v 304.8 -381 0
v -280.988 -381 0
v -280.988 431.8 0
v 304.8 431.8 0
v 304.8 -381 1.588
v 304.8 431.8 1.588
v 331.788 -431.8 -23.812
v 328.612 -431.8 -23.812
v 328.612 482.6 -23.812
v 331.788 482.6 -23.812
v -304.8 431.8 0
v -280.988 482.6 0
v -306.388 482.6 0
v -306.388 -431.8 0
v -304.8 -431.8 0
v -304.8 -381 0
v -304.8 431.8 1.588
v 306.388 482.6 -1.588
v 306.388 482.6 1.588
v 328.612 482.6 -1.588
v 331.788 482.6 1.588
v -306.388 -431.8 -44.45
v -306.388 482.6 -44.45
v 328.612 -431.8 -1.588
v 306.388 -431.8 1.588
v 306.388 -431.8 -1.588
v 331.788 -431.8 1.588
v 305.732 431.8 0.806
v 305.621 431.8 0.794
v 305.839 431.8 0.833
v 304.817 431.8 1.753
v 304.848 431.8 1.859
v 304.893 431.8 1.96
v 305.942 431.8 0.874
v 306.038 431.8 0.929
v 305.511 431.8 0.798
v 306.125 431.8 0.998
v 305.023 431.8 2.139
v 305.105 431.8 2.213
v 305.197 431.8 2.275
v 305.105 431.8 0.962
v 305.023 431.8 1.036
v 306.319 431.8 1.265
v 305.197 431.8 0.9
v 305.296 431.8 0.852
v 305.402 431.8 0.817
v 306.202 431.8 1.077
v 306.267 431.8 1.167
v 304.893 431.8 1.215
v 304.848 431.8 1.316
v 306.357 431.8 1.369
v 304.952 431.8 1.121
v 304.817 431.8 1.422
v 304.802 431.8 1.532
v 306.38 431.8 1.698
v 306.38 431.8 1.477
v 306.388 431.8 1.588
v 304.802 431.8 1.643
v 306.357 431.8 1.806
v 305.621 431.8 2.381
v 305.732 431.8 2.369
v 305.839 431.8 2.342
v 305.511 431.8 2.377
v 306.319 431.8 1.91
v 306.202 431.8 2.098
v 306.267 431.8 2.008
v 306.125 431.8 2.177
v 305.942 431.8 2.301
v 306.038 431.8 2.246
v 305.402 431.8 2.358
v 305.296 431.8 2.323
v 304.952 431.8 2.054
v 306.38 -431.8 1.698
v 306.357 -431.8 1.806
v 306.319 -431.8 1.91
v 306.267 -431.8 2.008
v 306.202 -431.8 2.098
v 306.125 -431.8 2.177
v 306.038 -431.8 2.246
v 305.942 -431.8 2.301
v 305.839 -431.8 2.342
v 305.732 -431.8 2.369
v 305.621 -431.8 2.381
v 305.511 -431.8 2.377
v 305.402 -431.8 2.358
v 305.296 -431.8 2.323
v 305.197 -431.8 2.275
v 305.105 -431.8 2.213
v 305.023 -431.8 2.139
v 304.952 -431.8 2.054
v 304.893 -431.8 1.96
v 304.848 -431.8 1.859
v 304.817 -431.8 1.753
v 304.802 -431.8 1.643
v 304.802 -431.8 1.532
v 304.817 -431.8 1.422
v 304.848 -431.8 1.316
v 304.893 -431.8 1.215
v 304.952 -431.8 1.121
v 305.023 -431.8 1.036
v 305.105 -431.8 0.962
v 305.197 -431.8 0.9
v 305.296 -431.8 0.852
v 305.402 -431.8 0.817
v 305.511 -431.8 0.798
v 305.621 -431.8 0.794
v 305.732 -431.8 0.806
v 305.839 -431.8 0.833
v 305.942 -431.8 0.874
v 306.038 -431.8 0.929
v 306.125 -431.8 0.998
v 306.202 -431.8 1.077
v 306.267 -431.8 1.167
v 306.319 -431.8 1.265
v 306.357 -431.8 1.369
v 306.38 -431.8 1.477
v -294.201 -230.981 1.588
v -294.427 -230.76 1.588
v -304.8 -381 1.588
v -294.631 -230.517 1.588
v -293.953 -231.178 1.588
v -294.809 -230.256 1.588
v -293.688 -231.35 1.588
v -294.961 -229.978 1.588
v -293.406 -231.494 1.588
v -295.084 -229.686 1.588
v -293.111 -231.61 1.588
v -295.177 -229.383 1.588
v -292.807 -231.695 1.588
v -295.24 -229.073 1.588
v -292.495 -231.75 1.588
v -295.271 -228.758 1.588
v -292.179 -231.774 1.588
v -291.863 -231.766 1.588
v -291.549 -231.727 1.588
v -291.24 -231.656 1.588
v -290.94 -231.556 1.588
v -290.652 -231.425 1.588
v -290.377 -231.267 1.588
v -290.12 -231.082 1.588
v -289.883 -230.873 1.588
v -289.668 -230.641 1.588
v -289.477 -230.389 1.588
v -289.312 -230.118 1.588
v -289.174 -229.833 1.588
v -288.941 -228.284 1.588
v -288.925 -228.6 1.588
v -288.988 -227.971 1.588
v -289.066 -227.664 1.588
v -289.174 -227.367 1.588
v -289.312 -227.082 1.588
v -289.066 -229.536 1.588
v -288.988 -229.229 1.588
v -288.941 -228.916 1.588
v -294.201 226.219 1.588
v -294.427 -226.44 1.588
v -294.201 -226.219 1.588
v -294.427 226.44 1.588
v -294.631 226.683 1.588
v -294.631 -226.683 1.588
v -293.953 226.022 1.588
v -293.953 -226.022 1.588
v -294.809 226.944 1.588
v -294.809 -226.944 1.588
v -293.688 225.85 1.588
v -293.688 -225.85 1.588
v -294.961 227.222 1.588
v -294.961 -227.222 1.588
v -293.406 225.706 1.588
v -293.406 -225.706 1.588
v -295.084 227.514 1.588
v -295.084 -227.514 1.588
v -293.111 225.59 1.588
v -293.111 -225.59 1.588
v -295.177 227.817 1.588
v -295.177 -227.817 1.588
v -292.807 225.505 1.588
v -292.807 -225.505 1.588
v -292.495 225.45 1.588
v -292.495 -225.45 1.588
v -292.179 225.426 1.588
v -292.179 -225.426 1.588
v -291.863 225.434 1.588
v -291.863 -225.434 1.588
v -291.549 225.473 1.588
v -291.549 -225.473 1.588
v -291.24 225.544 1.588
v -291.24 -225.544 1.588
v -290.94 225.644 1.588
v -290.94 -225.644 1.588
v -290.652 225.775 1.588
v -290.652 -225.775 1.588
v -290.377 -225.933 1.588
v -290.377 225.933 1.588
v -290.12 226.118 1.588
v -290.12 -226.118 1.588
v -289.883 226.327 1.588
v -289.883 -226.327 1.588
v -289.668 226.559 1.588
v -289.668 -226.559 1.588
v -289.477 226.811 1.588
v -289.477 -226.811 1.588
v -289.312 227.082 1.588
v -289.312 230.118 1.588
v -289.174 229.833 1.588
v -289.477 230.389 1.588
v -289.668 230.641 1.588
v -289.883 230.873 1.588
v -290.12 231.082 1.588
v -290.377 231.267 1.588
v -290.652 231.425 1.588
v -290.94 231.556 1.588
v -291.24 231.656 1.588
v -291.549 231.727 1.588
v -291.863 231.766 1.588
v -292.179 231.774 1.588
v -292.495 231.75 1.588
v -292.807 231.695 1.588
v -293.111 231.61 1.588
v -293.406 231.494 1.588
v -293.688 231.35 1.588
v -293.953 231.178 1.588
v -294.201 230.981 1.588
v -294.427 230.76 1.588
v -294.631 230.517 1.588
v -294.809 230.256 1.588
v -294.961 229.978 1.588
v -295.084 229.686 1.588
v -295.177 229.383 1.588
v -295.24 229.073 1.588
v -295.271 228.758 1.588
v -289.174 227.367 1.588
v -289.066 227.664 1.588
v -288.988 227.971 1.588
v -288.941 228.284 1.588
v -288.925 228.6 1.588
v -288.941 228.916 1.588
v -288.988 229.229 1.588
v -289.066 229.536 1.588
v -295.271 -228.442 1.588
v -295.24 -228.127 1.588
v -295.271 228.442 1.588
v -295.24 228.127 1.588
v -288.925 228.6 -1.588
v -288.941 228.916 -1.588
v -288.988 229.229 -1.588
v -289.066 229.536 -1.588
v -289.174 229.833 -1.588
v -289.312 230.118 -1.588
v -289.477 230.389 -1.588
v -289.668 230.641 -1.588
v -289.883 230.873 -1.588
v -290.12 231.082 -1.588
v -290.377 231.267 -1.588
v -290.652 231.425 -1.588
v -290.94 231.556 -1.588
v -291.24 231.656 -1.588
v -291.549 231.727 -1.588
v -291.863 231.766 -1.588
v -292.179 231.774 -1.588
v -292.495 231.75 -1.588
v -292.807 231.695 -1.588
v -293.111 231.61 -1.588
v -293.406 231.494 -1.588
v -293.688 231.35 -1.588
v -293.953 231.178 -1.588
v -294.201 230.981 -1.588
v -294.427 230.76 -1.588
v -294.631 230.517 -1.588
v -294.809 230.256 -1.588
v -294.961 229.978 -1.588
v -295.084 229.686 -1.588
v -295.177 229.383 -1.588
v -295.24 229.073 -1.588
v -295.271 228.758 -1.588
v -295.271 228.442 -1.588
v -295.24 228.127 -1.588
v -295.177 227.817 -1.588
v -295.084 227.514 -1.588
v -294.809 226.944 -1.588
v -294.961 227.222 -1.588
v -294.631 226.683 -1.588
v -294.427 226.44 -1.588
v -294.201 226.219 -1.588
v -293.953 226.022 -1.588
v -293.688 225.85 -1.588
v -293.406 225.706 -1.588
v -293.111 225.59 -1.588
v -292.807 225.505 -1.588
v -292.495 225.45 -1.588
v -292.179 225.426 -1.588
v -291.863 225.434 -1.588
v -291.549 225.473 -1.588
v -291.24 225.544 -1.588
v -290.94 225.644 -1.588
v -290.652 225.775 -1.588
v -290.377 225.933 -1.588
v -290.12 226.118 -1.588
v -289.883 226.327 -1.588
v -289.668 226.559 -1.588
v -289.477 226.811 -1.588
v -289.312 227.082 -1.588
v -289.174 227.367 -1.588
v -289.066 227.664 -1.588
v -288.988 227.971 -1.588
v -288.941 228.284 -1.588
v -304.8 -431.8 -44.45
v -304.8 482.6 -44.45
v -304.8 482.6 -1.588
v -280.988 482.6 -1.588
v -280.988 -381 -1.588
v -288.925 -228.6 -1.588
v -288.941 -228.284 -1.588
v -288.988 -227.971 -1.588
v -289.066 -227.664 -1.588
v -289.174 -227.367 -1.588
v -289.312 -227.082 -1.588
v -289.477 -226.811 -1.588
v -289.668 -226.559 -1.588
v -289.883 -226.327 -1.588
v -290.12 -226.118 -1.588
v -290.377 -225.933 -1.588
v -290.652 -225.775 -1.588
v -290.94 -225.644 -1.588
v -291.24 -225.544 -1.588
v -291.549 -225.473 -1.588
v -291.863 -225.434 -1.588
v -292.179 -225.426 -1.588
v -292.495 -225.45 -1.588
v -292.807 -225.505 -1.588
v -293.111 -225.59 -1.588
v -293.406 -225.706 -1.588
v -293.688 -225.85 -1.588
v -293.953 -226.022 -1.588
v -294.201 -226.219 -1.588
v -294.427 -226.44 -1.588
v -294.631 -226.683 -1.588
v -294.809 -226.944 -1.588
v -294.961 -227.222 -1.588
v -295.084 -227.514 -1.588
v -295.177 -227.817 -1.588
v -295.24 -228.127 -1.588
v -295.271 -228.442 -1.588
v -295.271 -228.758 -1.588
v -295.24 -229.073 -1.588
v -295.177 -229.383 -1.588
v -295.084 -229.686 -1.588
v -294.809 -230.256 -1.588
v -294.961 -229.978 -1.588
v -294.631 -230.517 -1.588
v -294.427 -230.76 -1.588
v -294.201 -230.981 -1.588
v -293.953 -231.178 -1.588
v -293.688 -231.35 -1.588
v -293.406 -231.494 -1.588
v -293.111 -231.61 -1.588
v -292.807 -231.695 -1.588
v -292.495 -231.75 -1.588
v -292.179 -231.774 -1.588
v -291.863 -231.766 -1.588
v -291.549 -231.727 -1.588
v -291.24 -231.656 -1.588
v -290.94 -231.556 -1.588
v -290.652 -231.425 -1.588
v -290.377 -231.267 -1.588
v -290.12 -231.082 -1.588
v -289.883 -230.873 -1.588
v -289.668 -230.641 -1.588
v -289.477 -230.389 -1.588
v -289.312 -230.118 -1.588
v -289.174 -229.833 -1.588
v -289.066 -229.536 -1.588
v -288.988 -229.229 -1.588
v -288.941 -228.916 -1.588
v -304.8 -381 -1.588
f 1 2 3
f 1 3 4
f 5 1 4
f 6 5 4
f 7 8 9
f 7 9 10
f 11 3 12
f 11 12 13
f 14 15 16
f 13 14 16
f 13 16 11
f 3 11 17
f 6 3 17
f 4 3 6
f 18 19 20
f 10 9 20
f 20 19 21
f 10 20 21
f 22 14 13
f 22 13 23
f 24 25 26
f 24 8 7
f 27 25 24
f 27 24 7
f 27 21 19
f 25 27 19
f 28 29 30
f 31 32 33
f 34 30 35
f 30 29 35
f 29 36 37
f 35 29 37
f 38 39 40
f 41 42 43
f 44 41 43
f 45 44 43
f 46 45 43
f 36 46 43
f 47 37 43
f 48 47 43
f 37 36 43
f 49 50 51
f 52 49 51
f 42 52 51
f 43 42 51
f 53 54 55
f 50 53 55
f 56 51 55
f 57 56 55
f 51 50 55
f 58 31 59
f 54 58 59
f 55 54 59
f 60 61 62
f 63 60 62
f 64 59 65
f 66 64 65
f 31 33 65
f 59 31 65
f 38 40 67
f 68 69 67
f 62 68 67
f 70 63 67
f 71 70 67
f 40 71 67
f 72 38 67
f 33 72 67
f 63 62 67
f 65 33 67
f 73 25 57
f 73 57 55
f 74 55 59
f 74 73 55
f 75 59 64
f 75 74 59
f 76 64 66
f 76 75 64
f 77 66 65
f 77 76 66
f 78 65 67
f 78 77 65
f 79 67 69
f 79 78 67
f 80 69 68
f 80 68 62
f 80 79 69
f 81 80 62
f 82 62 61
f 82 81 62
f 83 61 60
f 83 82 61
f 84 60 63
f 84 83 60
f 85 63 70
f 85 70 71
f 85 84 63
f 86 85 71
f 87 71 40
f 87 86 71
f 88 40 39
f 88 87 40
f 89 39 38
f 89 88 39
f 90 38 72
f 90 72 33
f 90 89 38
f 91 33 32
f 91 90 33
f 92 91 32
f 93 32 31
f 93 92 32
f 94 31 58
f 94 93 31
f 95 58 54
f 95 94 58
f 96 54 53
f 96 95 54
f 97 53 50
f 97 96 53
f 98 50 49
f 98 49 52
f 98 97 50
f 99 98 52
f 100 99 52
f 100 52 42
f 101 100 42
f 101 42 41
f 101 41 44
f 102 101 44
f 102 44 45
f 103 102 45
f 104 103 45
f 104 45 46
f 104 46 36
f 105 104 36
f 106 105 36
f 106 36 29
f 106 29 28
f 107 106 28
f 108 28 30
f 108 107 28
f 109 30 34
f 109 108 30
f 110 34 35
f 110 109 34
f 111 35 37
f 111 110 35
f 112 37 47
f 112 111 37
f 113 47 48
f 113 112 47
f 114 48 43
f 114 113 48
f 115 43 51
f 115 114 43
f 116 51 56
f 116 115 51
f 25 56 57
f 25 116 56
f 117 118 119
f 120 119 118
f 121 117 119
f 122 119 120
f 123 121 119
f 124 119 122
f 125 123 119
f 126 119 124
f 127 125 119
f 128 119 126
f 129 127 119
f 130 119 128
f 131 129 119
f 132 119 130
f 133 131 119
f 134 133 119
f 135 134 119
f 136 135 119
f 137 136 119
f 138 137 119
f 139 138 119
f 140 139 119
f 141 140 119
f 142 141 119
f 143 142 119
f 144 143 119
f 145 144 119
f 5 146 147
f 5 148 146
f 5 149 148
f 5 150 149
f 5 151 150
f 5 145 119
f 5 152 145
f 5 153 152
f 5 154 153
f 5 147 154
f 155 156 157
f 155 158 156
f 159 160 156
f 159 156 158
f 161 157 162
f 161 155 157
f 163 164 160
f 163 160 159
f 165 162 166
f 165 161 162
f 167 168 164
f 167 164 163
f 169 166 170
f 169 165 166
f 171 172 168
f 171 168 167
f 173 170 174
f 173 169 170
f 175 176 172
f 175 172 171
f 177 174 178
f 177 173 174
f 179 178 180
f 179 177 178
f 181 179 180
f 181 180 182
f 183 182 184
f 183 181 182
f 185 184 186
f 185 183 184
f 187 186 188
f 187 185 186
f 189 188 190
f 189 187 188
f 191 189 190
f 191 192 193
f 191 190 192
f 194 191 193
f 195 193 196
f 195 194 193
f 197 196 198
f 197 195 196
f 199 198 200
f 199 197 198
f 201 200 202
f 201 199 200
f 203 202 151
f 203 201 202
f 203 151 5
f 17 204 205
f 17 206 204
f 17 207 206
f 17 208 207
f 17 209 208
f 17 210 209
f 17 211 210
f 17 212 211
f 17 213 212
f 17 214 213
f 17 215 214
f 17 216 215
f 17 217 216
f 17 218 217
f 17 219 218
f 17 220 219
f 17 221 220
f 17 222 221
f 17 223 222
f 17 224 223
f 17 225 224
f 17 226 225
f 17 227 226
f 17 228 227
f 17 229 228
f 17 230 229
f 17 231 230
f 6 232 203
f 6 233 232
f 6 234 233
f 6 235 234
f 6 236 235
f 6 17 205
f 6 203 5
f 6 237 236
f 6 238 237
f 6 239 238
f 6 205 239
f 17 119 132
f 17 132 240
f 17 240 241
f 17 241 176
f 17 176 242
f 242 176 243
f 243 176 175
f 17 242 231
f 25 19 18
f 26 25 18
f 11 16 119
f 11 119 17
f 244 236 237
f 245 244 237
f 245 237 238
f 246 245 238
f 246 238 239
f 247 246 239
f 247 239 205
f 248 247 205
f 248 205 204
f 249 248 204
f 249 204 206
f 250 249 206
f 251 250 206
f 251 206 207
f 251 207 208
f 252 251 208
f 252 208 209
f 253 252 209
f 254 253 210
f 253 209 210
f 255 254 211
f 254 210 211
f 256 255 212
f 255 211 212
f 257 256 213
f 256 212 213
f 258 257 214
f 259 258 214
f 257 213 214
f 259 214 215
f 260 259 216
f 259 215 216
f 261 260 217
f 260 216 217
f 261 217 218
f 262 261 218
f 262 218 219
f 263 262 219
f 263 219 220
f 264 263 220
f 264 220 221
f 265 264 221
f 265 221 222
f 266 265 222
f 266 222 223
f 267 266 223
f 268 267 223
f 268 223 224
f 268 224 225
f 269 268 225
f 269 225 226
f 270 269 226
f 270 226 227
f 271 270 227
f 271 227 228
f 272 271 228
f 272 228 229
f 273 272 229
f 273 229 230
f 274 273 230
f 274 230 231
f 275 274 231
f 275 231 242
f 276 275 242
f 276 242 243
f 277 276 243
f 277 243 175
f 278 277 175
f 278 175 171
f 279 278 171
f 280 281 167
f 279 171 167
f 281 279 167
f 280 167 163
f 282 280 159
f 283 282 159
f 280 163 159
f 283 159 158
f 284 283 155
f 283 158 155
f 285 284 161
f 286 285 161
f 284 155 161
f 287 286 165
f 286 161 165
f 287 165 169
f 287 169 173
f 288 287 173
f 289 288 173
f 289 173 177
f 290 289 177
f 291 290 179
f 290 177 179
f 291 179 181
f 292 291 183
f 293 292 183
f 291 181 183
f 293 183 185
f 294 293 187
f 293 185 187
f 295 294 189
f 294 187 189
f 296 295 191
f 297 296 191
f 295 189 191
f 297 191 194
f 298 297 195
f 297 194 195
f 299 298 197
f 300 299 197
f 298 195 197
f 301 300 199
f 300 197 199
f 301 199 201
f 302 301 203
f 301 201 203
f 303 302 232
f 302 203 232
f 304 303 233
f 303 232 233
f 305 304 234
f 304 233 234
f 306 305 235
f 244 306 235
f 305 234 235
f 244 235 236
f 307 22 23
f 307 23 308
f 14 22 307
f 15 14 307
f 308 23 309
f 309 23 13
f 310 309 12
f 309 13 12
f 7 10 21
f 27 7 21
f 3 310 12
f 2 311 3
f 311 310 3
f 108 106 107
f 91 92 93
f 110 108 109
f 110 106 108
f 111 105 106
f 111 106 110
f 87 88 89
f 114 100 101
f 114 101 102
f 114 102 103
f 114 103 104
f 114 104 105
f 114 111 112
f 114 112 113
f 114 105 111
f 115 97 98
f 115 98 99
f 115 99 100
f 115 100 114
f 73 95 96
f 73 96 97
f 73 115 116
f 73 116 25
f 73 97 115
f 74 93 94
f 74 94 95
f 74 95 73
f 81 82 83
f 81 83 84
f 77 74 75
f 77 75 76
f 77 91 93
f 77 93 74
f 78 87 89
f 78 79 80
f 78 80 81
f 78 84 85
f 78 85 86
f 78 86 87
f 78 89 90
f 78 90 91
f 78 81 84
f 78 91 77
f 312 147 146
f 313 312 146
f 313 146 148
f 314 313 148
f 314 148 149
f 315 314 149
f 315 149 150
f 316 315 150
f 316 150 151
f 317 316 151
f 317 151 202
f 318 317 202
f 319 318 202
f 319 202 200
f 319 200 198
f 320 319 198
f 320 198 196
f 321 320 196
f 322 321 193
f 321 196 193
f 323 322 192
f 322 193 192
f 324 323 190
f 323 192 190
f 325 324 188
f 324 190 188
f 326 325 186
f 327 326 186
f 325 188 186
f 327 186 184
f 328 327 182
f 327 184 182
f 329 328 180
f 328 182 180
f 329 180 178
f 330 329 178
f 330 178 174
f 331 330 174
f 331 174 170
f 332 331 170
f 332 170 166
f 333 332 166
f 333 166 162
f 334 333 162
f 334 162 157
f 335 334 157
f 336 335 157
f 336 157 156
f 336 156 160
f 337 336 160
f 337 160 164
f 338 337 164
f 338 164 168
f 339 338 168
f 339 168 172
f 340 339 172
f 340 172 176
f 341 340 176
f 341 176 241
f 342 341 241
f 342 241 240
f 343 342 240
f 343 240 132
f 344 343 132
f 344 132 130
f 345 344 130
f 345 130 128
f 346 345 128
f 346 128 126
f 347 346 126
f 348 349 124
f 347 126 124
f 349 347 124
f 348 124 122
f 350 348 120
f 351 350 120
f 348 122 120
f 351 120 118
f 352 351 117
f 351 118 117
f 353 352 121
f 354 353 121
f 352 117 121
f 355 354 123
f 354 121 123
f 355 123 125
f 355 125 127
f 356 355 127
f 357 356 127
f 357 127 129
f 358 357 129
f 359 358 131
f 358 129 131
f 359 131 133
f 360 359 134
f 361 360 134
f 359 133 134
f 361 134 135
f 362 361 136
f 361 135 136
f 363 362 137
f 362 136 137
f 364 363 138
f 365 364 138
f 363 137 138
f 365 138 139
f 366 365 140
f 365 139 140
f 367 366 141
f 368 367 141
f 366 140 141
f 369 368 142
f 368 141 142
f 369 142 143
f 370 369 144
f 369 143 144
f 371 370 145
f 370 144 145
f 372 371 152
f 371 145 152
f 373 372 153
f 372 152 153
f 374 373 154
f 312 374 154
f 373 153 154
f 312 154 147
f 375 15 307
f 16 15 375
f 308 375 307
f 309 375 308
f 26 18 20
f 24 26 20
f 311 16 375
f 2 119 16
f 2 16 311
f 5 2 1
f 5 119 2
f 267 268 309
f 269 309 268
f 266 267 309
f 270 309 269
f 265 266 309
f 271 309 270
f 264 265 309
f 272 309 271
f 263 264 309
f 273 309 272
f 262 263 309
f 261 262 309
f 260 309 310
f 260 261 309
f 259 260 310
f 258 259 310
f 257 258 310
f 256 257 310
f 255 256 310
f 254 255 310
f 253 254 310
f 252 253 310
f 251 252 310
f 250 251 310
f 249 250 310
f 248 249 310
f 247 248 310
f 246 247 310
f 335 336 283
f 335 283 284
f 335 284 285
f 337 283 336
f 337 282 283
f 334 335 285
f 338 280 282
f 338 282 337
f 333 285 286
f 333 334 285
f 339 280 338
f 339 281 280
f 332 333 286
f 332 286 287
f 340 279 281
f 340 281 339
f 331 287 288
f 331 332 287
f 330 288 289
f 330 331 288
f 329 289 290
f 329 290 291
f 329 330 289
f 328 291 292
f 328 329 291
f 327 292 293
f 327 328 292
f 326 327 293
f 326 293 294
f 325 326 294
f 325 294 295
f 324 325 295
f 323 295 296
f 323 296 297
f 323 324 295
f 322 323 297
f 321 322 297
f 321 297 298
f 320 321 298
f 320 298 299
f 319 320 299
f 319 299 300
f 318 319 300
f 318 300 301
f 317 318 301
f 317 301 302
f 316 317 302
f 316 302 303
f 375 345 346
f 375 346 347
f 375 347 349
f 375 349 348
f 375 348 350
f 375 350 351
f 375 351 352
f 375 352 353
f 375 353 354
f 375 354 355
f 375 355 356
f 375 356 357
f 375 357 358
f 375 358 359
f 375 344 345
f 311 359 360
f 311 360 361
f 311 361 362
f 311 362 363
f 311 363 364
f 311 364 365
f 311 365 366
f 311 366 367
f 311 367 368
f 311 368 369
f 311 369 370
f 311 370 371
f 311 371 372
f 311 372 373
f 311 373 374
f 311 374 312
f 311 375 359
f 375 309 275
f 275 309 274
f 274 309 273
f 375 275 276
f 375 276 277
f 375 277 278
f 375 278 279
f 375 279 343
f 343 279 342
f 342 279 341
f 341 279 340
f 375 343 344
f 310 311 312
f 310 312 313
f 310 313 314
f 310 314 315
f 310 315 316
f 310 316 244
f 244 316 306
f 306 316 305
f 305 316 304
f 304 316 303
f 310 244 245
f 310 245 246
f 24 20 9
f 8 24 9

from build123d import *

# Parameters (mm, degrees)
F0_W     = 609.6
F0_H     = 863.6
F1_DEPTH = 1.5875
F3_DEPTH = 863.6
F5_DEPTH = 914.4
F4_R     = 3.175
F6_DEPTH = 25.4
F7_W     = 611.1875
F7_H     = 50.8
F8_DEPTH = 25.4


# Not quite as in the source:
# - a feature names something its author has since deleted; it is built from what else it names


with BuildPart() as f1:
    # F0 (on Top) → F1 (new body)
    with BuildSketch(Plane.XY):
        Rectangle(F0_W, F0_H)
    extrude(amount=F1_DEPTH)

    # F2 (on face) → F5 (join)
    with BuildSketch(Plane.XZ.offset(431.8)):
        Polygon((-280.9875, -1.5875), (-280.9875, 0), (-304.8, 0), (-306.3875, 0), (-306.3875, -44.45), (-304.8, -44.45), (-304.8, -1.5875), align=None)
    extrude(amount=-F5_DEPTH)

    # F4 (on face) → F6 (cut)
    with BuildSketch(Plane.XY.offset(1.5875)):
        with Locations((-292.1, 228.6)):
            Circle(F4_R)
        with Locations((-292.1, -228.6)):
            Circle(F4_R)
    extrude(amount=-F6_DEPTH, mode=Mode.SUBTRACT)

    # F7 (on face) → F8 (cut)
    with BuildSketch(Plane.XY.offset(1.5875)):
        with Locations((0.79375, -406.4)):
            Rectangle(F7_W, F7_H)
    extrude(amount=-F8_DEPTH, mode=Mode.SUBTRACT)


with BuildPart() as f3:
    # F2 (on face) → F3 (new body, through all)
    with BuildSketch(Plane.XZ.offset(431.8)):
        with BuildLine():
            ThreePointArc((304.8, 1.5875), (305.59375, 0.79375), (306.3875, 1.5875))
            ThreePointArc((306.3875, 1.5875), (305.59375, 2.38125), (304.8, 1.5875))
        make_face()
    extrude(amount=-F3_DEPTH)


with BuildPart() as f5:
    # F2 (on face) → F5, piece 2 (new body)
    with BuildSketch(Plane.XZ.offset(431.8)):
        Polygon((331.7875, 1.5875), (306.3875, 1.5875), (306.3875, -1.5875), (328.6125, -1.5875), (328.6125, -23.8125), (331.7875, -23.8125), align=None)
    extrude(amount=-F5_DEPTH)


solid = Compound([f1.part, f3.part, f5.part])
